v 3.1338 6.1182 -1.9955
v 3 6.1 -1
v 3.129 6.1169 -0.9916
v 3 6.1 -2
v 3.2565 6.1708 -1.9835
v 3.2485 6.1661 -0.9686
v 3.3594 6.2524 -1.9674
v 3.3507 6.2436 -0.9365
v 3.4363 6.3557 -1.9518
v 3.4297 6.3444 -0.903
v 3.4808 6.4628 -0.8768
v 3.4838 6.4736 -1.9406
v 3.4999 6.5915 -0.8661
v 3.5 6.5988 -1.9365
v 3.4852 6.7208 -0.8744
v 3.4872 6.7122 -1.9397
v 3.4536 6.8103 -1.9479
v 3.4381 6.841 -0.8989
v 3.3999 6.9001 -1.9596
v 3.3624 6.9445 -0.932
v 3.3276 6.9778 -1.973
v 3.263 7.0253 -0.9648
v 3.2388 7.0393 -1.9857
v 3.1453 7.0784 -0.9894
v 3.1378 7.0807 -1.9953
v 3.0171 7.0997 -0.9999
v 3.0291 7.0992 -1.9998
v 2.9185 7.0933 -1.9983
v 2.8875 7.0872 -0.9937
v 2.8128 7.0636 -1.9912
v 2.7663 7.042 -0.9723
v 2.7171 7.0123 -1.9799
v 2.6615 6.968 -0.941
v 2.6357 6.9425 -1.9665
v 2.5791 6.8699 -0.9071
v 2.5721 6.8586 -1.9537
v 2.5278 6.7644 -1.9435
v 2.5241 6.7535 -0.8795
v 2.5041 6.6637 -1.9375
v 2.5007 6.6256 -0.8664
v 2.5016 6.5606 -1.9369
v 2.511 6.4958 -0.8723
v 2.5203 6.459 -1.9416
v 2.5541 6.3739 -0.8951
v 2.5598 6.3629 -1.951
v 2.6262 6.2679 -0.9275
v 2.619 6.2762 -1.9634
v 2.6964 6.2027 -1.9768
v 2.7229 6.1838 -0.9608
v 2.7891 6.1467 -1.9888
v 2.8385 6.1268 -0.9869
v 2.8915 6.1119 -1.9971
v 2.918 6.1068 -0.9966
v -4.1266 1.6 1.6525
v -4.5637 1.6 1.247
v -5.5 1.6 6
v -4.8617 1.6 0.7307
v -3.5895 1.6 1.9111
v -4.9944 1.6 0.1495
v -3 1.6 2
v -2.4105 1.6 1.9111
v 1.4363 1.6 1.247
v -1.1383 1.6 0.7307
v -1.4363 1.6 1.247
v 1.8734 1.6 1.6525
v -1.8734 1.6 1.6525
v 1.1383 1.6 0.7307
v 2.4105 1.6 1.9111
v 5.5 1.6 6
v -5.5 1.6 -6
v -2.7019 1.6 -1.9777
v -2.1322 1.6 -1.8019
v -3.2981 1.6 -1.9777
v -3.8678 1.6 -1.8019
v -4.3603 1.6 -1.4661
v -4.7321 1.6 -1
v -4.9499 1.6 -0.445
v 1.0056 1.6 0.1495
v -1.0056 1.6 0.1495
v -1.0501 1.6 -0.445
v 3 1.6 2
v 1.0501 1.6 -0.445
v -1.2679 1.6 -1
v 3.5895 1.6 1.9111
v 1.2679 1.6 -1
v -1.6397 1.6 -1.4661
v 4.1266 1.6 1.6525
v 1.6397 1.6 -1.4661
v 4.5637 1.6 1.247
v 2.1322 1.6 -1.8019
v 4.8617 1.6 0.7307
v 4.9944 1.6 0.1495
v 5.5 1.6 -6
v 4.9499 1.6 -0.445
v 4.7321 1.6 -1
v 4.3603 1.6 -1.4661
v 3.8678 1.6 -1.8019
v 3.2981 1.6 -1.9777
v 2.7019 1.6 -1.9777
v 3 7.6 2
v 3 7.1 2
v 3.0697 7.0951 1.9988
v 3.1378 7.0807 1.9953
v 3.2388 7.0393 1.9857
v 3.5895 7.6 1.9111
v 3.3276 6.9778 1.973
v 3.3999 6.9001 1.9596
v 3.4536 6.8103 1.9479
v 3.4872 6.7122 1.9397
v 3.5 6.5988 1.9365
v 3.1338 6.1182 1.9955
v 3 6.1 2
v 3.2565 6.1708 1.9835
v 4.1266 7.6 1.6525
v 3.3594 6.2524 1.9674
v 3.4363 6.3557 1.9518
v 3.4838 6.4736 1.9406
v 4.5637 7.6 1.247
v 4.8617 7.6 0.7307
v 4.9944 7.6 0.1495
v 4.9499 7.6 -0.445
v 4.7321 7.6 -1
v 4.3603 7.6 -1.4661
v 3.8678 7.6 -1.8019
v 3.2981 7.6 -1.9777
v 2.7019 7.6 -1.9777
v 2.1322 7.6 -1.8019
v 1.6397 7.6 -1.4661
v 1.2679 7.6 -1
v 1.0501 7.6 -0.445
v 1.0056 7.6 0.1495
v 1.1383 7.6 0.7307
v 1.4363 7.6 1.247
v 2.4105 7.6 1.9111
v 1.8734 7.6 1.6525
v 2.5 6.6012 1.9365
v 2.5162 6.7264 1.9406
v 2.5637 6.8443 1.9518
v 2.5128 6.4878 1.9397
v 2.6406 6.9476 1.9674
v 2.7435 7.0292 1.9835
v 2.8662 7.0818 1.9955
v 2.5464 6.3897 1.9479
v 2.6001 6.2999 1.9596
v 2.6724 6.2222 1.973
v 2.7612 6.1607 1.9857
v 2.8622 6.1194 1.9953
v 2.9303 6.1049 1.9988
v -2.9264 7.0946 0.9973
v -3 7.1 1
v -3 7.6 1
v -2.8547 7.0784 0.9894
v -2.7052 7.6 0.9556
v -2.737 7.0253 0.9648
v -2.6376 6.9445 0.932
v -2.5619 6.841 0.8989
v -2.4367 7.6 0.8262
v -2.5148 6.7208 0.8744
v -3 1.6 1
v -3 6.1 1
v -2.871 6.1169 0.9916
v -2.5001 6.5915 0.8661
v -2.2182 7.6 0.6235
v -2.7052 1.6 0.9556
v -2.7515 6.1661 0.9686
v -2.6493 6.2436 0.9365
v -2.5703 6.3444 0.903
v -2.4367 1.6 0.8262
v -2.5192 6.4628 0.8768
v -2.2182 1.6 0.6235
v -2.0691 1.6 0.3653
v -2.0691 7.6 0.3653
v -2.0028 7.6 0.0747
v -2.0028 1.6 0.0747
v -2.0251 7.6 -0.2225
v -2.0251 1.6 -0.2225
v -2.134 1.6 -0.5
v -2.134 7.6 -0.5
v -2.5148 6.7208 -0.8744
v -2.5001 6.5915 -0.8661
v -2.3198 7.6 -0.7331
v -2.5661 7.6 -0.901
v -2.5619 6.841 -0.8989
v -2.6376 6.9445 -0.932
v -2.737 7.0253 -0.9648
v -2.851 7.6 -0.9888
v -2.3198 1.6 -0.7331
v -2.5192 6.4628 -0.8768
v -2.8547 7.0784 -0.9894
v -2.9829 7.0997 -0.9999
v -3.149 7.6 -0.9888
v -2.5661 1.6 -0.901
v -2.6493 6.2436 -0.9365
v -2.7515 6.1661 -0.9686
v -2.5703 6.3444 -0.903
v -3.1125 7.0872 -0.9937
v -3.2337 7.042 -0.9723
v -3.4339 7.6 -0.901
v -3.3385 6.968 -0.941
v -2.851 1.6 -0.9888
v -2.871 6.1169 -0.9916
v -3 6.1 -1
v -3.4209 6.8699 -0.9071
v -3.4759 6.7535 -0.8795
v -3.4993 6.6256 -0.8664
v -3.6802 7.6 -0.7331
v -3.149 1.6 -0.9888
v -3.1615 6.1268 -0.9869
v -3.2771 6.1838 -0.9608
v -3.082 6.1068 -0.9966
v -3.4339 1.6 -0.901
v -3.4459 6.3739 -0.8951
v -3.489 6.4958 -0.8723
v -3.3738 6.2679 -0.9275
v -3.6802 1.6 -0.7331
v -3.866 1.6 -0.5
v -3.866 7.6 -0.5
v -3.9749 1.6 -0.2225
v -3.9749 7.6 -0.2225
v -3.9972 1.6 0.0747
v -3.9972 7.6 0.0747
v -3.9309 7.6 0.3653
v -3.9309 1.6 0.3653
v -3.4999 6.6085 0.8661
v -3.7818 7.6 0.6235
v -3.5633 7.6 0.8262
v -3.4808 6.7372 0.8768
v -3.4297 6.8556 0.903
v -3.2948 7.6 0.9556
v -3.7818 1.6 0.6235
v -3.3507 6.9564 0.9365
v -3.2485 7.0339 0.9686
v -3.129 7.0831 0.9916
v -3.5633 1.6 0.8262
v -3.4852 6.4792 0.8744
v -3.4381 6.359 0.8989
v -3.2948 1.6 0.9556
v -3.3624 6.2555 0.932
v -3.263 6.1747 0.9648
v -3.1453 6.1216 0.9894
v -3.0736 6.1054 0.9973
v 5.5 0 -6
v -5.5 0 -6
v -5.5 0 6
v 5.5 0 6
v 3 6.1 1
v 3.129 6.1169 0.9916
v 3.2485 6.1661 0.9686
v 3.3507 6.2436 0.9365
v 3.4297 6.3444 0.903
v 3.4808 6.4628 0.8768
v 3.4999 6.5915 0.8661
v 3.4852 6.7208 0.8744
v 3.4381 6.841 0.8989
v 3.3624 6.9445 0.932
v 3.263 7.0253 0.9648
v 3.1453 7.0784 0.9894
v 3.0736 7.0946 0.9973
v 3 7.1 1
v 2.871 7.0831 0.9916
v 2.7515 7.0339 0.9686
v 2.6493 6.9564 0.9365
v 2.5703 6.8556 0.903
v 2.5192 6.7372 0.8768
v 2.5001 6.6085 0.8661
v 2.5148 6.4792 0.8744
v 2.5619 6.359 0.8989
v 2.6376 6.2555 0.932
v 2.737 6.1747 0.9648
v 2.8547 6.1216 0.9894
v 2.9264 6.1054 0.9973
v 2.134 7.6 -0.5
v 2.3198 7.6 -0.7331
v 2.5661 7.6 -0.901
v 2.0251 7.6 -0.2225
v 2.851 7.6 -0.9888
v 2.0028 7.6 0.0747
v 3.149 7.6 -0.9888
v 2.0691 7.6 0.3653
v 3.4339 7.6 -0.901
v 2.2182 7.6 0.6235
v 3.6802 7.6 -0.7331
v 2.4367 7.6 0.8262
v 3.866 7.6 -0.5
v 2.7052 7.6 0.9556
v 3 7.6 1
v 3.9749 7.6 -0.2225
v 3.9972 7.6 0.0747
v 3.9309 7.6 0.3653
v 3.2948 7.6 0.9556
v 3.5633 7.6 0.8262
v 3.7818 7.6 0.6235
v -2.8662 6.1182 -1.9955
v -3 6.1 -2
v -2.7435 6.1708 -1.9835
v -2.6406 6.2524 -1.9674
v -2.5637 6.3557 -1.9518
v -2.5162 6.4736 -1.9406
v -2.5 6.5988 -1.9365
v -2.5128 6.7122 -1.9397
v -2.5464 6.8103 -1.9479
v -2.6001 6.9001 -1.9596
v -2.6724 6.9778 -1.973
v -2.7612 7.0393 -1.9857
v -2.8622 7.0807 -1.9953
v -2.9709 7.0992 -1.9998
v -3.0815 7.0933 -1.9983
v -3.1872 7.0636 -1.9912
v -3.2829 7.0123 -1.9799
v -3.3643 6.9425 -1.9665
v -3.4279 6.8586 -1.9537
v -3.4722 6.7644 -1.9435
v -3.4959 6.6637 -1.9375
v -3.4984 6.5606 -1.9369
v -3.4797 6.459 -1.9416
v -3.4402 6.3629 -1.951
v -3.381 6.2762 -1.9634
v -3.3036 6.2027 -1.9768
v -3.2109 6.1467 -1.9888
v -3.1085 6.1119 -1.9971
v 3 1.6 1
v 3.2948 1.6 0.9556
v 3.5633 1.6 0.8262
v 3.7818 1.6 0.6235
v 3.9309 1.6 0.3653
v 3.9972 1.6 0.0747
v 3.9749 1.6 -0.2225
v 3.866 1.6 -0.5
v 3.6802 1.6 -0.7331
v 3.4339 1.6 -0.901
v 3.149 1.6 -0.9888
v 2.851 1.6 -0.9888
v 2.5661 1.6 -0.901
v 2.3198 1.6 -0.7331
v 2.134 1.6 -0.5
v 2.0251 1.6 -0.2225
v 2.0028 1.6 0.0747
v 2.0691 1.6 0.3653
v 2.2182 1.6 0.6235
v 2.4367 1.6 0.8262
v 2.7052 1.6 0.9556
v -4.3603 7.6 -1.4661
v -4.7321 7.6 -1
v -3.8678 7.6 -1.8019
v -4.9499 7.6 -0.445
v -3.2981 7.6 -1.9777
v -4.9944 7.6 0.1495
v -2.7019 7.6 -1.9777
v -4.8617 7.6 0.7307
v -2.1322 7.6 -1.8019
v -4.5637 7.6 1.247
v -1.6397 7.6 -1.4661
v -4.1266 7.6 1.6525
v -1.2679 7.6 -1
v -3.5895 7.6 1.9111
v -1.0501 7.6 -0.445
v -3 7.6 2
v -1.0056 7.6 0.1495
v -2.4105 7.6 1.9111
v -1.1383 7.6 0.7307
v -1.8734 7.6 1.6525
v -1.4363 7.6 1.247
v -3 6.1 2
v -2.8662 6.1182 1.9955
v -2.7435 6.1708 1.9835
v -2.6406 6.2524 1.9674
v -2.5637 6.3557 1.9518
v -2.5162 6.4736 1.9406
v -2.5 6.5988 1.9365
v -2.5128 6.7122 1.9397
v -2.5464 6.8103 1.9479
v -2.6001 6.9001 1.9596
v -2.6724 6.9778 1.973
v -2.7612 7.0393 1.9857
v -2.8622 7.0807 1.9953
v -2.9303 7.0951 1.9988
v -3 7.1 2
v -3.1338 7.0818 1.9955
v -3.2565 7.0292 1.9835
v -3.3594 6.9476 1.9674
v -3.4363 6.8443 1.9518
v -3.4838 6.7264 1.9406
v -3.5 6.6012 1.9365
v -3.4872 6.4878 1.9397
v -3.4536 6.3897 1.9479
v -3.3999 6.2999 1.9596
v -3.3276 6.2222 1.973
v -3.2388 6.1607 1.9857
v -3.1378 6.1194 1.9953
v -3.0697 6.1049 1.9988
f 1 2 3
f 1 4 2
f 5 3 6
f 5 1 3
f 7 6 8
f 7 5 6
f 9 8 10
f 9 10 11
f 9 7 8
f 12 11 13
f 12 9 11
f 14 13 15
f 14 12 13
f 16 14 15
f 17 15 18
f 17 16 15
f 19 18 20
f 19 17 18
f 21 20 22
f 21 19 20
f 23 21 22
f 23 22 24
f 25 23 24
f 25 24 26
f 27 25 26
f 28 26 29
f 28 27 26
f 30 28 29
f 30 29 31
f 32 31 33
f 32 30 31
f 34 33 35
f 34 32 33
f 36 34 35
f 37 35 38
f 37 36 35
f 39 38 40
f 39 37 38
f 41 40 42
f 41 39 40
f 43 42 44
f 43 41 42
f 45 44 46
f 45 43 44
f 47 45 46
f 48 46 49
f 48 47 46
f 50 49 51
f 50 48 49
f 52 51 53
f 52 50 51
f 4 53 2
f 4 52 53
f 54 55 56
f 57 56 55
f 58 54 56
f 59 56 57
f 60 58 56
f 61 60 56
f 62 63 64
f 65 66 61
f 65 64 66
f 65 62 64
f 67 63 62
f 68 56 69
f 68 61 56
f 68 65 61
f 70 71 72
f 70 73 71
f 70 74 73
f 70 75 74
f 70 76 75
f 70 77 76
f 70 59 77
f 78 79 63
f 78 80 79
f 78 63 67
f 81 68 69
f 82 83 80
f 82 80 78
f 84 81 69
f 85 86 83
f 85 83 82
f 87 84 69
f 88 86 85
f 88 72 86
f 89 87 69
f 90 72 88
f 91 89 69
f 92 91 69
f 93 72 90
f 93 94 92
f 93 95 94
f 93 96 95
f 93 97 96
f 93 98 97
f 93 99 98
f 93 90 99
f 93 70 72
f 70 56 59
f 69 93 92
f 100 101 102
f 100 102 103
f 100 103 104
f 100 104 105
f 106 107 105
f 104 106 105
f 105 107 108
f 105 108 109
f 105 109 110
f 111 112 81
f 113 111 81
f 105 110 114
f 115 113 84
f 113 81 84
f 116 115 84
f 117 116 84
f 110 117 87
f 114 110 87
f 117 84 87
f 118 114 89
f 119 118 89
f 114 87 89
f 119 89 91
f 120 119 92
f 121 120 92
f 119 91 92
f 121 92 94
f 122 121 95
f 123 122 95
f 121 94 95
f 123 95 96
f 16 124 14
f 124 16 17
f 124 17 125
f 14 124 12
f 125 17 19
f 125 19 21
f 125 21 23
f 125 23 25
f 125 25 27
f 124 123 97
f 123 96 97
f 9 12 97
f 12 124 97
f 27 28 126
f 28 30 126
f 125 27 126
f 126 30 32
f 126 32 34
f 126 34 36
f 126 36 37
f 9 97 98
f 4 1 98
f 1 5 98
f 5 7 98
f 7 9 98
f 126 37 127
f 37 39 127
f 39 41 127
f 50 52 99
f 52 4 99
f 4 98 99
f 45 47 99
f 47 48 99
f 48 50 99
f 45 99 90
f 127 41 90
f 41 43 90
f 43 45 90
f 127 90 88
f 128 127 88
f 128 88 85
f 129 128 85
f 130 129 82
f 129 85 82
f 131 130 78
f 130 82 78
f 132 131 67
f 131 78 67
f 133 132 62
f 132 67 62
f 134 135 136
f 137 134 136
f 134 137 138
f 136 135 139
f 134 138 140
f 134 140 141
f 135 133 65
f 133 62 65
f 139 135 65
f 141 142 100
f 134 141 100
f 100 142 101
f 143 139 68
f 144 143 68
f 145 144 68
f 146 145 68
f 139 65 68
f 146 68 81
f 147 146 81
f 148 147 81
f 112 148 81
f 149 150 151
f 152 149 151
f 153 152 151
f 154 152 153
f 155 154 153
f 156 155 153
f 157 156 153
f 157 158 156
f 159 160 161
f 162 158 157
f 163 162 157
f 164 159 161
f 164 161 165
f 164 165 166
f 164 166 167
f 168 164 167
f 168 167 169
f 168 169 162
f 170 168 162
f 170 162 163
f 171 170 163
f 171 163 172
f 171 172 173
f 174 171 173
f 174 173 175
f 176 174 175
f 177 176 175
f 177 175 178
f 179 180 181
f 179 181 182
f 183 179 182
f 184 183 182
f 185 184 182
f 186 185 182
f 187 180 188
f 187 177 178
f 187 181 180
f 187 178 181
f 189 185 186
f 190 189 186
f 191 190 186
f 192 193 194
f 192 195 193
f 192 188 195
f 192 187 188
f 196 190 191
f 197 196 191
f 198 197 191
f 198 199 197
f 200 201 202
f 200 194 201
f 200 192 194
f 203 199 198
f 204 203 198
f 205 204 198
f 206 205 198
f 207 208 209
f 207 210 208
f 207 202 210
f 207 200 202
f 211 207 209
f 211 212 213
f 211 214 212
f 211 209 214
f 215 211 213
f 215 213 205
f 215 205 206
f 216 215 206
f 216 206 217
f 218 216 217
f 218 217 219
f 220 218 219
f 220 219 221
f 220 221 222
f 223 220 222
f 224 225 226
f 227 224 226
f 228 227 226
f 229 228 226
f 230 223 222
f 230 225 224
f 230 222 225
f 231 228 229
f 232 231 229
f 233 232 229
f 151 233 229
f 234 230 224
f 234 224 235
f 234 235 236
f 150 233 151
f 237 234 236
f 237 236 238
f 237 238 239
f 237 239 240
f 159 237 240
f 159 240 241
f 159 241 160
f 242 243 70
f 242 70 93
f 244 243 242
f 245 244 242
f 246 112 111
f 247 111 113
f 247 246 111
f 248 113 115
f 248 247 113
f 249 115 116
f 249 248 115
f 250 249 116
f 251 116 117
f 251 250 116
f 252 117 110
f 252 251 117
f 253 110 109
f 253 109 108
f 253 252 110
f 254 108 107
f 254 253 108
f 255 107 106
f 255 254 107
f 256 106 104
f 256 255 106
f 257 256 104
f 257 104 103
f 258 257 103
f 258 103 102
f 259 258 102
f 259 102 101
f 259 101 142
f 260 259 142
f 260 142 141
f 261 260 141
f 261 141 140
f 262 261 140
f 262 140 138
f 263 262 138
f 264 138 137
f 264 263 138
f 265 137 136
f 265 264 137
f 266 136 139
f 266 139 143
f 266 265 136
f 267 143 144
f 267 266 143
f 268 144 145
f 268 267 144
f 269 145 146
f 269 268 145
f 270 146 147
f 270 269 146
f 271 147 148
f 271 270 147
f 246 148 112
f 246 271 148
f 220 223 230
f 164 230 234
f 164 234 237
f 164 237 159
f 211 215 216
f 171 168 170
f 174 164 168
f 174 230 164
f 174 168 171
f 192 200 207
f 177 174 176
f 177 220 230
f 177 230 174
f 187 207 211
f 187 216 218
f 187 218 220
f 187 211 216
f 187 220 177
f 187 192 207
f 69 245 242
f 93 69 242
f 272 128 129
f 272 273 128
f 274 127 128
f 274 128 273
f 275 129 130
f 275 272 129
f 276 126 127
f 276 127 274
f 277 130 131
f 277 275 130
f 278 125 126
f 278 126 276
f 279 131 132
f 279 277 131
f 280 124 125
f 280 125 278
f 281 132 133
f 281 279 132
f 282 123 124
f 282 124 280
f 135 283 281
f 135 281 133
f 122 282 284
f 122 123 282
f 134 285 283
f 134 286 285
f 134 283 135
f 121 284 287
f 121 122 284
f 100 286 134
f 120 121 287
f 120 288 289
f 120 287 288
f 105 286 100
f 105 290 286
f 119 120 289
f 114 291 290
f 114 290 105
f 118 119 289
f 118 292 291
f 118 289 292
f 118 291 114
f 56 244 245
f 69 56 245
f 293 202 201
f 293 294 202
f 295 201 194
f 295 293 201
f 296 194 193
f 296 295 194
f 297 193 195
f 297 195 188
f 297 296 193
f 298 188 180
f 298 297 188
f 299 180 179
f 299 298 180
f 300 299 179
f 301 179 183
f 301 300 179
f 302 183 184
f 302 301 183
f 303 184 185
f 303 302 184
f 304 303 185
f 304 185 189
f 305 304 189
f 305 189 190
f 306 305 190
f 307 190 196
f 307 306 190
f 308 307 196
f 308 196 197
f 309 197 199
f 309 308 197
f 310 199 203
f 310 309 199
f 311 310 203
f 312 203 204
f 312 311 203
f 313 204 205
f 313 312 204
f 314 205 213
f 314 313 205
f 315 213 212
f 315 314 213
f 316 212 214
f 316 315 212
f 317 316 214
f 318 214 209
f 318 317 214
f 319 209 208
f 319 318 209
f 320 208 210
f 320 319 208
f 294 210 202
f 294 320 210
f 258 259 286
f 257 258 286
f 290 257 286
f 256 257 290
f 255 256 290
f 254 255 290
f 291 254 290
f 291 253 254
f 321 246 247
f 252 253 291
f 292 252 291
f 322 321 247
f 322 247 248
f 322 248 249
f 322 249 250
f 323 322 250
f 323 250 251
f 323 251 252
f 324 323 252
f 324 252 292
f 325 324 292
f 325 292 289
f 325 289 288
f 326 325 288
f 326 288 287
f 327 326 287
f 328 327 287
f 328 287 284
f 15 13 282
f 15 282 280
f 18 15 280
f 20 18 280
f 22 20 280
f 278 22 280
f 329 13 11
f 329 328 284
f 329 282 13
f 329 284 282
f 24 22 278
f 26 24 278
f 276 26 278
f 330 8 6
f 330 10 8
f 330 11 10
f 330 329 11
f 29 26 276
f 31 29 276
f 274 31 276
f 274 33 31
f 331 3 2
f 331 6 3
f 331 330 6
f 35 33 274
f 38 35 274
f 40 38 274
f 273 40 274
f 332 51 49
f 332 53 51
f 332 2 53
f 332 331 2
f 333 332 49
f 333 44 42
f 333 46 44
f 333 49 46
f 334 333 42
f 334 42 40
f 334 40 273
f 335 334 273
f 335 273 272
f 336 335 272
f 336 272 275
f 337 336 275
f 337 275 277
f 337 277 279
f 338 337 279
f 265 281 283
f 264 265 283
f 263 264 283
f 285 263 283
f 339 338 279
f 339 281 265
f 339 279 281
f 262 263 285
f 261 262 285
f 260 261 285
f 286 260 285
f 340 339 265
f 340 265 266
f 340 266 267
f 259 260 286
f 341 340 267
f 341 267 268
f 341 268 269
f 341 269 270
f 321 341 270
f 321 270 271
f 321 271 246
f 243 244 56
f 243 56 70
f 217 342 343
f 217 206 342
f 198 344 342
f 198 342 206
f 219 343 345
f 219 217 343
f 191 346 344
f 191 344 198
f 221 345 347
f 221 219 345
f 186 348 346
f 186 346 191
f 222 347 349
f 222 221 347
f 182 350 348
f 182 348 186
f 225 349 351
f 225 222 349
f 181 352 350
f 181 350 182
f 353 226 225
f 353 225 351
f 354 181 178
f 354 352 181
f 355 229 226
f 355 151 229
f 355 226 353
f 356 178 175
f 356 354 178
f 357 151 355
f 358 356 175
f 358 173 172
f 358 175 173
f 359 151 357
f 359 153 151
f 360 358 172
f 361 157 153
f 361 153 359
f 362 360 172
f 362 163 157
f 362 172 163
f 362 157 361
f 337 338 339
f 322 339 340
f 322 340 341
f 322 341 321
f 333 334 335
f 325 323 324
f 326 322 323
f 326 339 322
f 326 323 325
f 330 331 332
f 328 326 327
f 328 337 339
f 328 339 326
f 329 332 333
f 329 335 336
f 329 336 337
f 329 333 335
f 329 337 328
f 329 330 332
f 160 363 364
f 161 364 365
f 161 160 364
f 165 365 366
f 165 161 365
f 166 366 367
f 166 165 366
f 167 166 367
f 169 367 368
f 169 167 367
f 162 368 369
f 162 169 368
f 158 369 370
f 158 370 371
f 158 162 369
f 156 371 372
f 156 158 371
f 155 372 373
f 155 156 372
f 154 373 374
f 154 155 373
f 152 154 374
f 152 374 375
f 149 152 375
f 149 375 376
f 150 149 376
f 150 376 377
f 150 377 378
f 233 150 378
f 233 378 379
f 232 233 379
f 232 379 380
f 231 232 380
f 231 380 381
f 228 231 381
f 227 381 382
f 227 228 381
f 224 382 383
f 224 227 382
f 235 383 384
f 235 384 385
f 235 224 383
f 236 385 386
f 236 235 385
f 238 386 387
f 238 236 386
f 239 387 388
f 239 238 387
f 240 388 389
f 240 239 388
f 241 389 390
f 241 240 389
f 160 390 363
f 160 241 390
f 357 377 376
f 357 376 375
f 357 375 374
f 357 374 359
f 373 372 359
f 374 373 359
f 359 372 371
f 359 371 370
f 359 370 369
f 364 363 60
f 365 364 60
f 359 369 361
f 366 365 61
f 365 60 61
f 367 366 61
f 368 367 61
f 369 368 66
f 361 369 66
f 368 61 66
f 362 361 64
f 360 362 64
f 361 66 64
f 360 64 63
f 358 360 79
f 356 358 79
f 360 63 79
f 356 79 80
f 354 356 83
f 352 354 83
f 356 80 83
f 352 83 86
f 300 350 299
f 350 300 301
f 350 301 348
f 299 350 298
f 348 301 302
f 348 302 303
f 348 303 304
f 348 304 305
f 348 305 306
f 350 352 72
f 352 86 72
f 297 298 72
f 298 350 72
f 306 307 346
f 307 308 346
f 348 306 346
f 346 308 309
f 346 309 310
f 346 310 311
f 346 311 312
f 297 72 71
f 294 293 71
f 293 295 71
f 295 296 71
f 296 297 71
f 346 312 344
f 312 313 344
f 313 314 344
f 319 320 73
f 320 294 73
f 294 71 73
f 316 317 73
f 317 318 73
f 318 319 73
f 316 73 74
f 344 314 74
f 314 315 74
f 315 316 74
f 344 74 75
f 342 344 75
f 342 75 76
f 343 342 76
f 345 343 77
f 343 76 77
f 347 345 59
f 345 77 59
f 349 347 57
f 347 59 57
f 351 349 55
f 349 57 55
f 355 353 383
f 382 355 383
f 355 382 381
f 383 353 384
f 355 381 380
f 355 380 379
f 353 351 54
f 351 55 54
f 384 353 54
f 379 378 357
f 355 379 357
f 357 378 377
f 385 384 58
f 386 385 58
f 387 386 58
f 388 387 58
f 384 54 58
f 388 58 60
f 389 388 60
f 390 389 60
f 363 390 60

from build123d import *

# Parameters (mm, degrees)
SKETCH1_W               = 11
SKETCH1_H               = 12
BOSS_EXTRUDE1_DEPTH     = 1.6
SKETCH2_R               = 2
SKETCH2_R_2             = 1
BOSS_EXTRUDE2_DEPTH     = 6
CUT_EXTRUDE1_DEPTH      = 2
CUT_EXTRUDE1_DEPTH_BACK = 2
SKETCH3_R               = 0.5


with BuildPart() as part:
    # Sketch1 → Boss-Extrude1 (new body)
    with BuildSketch(Plane(origin=(0, 0, 0), x_dir=(1, 0, 0), z_dir=(0, 1, 0))):
        Rectangle(SKETCH1_W, SKETCH1_H)
    extrude(amount=BOSS_EXTRUDE1_DEPTH)

    # Sketch2 → Boss-Extrude2 (add)
    # profile 1 of 2: a face of its own
    with BuildSketch(Plane(origin=(0, 1.6, 0), x_dir=(1, 0, 0), z_dir=(0, 1, 0))):
        with Locations(Location((-3, 0, 0), (0, 0, 270))):
            Circle(SKETCH2_R)
        with Locations(Location((-3, 0, 0), (0, 0, 270))):
            Circle(SKETCH2_R_2, mode=Mode.SUBTRACT)
    # profile 2 of 2: a face of its own
    with BuildSketch(Plane(origin=(0, 1.6, 0), x_dir=(1, 0, 0), z_dir=(0, 1, 0))):
        with Locations(Location((3, 0, 0), (0, 0, 270))):
            Circle(SKETCH2_R)
        with Locations(Location((3, 0, 0), (0, 0, 270))):
            Circle(SKETCH2_R_2, mode=Mode.SUBTRACT)
    extrude(amount=BOSS_EXTRUDE2_DEPTH)

    # Sketch3 → Cut-Extrude1 (cut, two sides: drawn at the far end of the back side and taken through both)
    with BuildSketch(Plane.XY.offset(-CUT_EXTRUDE1_DEPTH_BACK)):
        with Locations(Location((-3, 6.6, 0), (0, 0, 270.000000002))):
            Circle(SKETCH3_R)
        with Locations(Location((3, 6.6, 0), (0, 0, 270.000000002))):
            Circle(SKETCH3_R)
    extrude(amount=CUT_EXTRUDE1_DEPTH + CUT_EXTRUDE1_DEPTH_BACK, mode=Mode.SUBTRACT)


solid = part.part
